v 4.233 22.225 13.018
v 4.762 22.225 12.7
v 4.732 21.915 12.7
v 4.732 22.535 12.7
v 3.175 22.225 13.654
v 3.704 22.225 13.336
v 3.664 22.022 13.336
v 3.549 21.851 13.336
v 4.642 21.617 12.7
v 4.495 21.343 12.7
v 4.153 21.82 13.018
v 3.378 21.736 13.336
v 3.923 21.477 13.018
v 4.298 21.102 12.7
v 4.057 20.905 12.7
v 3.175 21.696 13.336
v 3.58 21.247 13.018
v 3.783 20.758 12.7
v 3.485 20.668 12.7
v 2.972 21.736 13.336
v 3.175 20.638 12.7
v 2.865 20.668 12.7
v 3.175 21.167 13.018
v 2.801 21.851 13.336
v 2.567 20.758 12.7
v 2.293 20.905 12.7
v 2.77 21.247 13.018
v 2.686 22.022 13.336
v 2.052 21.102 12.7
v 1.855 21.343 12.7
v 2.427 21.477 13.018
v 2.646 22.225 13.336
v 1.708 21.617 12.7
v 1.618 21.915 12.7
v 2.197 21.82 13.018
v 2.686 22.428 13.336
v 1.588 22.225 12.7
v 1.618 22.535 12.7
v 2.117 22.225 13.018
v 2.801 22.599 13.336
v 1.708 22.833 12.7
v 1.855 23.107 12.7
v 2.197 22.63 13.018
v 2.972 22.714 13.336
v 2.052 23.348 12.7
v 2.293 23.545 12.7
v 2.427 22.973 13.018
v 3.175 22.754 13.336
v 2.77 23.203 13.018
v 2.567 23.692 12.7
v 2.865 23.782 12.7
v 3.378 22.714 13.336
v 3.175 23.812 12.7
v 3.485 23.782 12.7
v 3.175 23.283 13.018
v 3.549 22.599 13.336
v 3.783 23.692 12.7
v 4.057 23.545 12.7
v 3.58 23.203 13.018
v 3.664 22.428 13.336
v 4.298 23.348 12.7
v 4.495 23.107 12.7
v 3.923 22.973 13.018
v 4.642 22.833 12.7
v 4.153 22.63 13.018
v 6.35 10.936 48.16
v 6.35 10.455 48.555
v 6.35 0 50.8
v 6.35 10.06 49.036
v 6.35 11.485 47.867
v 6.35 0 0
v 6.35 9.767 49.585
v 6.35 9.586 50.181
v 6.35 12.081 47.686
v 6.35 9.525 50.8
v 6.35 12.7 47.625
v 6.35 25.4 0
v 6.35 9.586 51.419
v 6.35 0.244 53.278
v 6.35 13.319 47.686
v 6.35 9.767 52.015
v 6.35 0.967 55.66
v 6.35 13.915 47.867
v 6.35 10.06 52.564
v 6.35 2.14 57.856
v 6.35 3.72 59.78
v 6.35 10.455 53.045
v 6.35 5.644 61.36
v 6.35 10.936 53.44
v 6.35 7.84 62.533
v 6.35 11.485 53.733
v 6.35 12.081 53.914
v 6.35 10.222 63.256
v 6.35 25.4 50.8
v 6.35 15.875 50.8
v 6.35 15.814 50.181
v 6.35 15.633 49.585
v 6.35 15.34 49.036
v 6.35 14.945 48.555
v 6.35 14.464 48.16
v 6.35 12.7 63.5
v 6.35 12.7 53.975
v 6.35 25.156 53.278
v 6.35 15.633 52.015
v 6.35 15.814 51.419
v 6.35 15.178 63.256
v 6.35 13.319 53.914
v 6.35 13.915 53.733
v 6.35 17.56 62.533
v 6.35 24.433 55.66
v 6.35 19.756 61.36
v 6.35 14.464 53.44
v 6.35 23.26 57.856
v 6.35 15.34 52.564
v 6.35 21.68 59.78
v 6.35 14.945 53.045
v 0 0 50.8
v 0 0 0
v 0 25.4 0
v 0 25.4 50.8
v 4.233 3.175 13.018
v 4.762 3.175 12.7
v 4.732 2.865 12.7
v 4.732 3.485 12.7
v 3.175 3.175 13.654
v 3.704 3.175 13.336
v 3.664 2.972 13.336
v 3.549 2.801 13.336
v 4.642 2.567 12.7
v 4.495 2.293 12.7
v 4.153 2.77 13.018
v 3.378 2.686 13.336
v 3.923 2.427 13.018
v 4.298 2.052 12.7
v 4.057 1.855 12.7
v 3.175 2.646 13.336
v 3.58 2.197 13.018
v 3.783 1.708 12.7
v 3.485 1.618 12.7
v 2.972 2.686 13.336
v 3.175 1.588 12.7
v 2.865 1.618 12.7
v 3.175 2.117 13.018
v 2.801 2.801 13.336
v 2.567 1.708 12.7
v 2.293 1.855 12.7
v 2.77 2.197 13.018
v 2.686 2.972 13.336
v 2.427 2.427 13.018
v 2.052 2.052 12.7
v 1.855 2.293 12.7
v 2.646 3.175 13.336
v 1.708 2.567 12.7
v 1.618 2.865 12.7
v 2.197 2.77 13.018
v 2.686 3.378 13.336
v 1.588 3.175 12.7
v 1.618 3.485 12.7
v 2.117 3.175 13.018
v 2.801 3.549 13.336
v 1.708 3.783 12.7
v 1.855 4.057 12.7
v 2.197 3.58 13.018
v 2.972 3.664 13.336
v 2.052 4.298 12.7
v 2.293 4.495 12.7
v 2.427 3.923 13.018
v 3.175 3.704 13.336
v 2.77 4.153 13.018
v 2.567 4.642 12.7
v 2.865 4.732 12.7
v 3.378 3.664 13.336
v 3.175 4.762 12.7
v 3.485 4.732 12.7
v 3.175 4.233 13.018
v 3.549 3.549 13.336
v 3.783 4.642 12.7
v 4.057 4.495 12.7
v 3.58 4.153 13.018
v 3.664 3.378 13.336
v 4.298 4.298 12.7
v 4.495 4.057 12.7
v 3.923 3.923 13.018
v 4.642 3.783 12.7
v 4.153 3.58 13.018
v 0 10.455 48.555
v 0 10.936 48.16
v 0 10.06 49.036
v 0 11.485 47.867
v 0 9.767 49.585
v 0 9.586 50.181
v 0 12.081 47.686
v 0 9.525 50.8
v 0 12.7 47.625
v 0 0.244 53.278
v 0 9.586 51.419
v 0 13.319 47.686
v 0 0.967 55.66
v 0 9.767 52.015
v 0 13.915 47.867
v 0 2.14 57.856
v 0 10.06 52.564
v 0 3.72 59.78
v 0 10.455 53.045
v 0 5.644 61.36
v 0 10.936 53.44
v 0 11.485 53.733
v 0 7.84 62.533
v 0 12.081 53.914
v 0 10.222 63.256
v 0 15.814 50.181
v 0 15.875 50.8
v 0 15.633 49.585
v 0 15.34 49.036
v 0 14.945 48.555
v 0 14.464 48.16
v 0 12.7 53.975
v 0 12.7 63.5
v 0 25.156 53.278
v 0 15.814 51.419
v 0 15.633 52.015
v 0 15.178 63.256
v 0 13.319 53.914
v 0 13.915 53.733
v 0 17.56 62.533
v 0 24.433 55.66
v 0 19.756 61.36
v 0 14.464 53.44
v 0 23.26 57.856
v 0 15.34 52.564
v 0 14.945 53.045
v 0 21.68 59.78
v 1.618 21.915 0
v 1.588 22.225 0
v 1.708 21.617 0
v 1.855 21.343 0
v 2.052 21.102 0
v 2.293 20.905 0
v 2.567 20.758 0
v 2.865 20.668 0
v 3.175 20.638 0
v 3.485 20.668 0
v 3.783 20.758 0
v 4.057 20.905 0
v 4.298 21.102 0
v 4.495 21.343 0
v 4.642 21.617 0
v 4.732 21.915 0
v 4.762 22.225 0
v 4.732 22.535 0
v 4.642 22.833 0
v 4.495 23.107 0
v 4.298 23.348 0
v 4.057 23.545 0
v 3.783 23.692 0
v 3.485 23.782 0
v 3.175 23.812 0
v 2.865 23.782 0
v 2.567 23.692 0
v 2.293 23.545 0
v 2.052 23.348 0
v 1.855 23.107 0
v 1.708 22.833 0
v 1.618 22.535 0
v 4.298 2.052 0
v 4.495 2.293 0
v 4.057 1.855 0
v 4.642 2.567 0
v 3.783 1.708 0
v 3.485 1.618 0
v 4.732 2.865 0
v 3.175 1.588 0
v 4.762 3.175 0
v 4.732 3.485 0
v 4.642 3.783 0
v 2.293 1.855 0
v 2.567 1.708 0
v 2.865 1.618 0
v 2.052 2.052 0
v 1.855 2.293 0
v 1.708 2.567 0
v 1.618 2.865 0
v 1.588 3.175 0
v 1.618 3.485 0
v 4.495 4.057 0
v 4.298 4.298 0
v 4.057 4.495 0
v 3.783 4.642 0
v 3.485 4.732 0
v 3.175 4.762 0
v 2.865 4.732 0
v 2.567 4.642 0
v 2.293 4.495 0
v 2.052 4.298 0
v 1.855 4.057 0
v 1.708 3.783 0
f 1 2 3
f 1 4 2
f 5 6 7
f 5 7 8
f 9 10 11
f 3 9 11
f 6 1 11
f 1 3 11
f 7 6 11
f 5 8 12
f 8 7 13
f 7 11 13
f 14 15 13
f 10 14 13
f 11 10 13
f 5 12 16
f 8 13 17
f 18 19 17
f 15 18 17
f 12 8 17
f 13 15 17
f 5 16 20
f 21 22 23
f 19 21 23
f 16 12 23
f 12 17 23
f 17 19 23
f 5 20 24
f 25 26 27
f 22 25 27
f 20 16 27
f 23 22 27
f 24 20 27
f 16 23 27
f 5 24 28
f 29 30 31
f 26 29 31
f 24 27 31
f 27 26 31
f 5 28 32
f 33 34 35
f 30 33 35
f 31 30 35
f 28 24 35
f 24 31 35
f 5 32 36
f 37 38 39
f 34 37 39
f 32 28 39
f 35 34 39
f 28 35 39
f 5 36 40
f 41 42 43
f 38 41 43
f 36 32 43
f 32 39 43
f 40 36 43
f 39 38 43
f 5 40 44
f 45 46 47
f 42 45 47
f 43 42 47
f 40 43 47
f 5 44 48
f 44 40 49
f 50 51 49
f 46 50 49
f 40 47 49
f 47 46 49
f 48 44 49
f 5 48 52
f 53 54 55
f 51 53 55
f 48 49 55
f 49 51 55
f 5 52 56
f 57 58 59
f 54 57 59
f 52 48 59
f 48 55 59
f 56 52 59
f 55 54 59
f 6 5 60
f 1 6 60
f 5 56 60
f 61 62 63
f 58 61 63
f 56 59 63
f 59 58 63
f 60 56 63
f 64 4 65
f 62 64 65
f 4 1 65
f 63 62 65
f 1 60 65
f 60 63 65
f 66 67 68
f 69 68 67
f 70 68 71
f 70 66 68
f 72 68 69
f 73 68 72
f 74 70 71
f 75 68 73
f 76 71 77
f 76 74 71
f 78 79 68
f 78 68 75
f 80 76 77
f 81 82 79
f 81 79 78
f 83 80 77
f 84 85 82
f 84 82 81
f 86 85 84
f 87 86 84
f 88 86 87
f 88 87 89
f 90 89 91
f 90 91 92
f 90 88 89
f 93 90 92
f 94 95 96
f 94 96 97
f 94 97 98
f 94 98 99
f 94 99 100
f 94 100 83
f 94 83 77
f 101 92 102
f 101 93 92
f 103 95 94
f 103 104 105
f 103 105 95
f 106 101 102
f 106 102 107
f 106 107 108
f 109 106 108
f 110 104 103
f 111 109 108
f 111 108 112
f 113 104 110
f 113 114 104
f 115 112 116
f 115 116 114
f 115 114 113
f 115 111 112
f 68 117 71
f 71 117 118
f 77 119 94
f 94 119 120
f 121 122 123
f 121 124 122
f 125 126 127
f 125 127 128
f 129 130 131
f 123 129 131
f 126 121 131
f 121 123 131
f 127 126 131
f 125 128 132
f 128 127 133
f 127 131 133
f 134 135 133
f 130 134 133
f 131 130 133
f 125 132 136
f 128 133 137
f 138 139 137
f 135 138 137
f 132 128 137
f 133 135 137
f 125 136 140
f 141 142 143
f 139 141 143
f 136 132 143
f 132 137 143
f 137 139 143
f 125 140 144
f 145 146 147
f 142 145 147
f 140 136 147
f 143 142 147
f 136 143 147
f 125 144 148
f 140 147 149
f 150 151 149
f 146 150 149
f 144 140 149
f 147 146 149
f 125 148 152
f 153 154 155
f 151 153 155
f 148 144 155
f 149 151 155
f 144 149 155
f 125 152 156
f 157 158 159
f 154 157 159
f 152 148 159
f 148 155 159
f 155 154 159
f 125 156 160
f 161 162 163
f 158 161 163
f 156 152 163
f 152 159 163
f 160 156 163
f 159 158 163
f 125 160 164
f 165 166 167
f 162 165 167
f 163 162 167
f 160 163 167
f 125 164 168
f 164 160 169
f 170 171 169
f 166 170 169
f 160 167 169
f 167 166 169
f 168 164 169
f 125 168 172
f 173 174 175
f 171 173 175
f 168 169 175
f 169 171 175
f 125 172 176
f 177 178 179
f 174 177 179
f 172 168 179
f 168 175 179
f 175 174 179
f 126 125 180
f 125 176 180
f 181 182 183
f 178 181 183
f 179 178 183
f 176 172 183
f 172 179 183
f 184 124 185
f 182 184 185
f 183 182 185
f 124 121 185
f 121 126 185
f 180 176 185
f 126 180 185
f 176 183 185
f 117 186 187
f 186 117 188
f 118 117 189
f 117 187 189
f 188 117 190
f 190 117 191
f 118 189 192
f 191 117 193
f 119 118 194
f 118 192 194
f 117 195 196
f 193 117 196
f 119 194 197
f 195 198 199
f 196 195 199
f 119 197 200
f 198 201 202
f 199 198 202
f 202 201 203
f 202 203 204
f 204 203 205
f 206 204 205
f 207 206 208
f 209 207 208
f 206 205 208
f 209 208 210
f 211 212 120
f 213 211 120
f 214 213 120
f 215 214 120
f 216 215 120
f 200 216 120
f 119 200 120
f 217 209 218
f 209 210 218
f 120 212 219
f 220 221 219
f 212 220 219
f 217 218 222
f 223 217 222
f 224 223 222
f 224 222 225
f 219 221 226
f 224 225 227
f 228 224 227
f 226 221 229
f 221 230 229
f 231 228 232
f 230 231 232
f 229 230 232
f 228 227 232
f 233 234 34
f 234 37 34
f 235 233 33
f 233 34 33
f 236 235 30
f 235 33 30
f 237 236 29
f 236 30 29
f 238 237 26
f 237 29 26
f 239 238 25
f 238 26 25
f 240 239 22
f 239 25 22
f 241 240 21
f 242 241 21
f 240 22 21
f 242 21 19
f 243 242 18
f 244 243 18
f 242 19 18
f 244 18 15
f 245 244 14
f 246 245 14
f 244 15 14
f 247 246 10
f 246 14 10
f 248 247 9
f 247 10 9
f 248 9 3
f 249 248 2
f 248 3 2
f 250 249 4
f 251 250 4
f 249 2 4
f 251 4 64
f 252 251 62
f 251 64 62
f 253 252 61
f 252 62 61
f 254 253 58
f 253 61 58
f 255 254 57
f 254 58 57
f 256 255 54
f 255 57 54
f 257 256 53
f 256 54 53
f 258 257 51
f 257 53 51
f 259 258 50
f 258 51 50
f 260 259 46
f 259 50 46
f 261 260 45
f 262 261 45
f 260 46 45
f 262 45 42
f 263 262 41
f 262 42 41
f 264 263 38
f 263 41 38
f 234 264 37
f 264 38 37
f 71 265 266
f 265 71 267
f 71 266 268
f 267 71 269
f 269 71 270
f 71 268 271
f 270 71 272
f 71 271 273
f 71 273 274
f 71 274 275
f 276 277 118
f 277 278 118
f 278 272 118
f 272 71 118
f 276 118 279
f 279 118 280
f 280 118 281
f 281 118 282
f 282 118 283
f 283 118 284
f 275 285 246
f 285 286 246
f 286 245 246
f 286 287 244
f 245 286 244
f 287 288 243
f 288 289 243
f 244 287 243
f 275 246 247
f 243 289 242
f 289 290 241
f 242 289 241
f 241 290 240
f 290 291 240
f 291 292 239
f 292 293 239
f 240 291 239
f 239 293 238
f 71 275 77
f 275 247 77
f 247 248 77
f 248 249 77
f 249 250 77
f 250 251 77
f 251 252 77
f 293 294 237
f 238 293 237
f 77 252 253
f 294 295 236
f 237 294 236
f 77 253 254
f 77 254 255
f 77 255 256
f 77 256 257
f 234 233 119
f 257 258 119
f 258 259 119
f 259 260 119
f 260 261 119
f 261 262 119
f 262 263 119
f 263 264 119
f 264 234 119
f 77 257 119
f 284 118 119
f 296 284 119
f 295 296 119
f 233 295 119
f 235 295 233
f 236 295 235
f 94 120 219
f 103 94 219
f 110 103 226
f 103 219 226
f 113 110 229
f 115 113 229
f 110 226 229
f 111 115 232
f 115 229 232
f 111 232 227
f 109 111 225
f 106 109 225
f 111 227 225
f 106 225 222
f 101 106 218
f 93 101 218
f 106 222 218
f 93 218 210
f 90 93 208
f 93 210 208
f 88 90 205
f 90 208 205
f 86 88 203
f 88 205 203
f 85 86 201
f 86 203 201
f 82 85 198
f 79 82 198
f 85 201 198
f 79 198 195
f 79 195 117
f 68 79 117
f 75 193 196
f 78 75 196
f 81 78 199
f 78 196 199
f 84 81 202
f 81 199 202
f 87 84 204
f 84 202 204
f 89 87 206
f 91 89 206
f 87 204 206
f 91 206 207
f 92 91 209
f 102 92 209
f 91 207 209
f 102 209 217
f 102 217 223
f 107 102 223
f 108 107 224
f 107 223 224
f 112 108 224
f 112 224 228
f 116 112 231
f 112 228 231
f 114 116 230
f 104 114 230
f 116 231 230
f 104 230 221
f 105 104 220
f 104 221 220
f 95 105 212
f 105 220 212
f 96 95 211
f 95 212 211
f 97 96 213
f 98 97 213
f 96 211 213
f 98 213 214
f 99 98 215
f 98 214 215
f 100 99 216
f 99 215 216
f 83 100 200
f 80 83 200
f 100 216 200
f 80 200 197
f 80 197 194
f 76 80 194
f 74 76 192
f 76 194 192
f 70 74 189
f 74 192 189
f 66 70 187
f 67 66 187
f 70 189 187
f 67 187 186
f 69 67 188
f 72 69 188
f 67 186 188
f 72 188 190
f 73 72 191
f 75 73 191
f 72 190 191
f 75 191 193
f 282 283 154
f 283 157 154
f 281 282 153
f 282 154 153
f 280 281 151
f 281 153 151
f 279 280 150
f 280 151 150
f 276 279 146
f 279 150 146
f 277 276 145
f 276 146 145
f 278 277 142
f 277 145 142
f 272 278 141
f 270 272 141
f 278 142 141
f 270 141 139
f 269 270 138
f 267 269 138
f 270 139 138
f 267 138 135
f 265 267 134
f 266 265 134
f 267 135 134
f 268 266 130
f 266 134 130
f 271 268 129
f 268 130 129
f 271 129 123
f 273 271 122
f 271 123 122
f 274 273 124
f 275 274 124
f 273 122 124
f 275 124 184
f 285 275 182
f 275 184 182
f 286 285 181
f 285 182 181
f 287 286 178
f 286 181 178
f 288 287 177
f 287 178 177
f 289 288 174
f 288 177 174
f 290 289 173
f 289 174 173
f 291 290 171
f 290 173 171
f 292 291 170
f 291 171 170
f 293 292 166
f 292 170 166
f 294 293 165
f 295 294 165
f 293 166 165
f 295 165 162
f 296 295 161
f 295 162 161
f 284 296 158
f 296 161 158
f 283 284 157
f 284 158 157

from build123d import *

# Parameters (mm, degrees)
F1_DEPTH = 6.35
F3_D     = 3.175
F3_DEPTH = 12.7
F3_TIP   = 0.9538662327


with BuildPart() as f1:
    # F0 (on Right) → F1 (new body)
    with BuildSketch(Plane.YZ):
        with BuildLine():
            Line((0, 50.8), (0, 0))
            Line((0, 0), (25.4, 0))
            Line((25.4, 0), (25.4, 50.8))
            ThreePointArc((25.4, 50.8), (12.7, 38.1), (0, 50.8))
        make_face()
        with BuildLine():
            Line((9.525, 50.8), (0, 50.8))
            ThreePointArc((0, 50.8), (12.7, 38.1), (25.4, 50.8))
            Line((25.4, 50.8), (15.875, 50.8))
            ThreePointArc((15.875, 50.8), (12.7, 47.625), (9.525, 50.8))
        make_face()
        with BuildLine():
            ThreePointArc((25.4, 50.8), (12.7, 63.5), (0, 50.8))
            Line((0, 50.8), (9.525, 50.8))
            ThreePointArc((9.525, 50.8), (12.7, 53.975), (15.875, 50.8))
            Line((15.875, 50.8), (25.4, 50.8))
        make_face()
    extrude(amount=F1_DEPTH)

    # F3
    with Locations(Plane(origin=(0, 0, 0), x_dir=(1, 0, 0), z_dir=(0, 0, -1))):
        with Locations((3.175, -3.175), (3.175, -22.225)):
            Hole(F3_D / 2, depth=F3_DEPTH)
            with Locations((0, 0, -(F3_DEPTH + F3_TIP / 2))):  # 118° drill point
                Cone(0, F3_D / 2, F3_TIP, mode=Mode.SUBTRACT)


solid = f1.part
